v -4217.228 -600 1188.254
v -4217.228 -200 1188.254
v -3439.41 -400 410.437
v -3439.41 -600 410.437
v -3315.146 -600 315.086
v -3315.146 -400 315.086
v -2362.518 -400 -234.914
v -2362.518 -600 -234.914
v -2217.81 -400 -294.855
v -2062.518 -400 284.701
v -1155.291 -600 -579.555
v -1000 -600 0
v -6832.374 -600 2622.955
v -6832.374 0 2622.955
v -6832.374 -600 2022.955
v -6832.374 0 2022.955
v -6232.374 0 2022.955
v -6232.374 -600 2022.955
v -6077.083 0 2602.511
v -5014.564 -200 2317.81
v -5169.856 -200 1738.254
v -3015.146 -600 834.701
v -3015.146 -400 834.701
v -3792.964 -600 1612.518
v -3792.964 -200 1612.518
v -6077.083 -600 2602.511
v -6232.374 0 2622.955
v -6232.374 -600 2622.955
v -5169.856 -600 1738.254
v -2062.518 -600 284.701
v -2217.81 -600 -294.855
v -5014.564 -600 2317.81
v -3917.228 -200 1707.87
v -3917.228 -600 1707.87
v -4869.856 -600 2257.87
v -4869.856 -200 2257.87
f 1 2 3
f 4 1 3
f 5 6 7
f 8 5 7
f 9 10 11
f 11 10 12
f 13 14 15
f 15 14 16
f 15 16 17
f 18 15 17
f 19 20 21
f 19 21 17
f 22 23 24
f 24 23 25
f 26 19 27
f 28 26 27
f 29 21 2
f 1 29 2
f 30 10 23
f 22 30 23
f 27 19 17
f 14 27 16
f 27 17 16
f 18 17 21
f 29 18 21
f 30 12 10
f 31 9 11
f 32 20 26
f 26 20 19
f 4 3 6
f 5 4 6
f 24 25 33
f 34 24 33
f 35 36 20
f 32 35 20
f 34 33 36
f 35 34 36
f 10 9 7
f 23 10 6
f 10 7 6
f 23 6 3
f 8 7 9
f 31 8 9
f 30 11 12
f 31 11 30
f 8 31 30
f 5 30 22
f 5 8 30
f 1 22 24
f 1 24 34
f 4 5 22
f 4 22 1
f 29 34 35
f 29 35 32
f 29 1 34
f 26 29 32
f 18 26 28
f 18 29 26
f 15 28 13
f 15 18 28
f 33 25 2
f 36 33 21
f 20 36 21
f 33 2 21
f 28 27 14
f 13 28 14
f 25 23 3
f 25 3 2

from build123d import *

# Parameters (mm, degrees)
BOSS_EXTRUDE1_DEPTH = 600
CUT_EXTRUDE1_DEPTH  = 600
CUT_EXTRUDE2_DEPTH  = 600
CUT_EXTRUDE3_DEPTH  = 400
CUT_EXTRUDE4_DEPTH  = 600
CUT_EXTRUDE5_DEPTH  = 200
CUT_EXTRUDE6_DEPTH  = 6000
SKETCH16_W          = 2532.923378498
SKETCH16_H          = 1485.911209515
CUT_EXTRUDE7_DEPTH  = 1000


with BuildPart() as part:
    # Sketch1 → Boss-Extrude1 (new body)
    with BuildSketch(Plane(origin=(0, 0, 0), x_dir=(1, 0, 0), z_dir=(0, 1, 0))):
        Polygon((0, 0), (-1000, 0), (-2062.518408918, -284.700949613), (-3015.146353081, -834.700949613), (-3792.963812386, -1612.518408918), (-3917.227881098, -1707.869582477), (-4869.855825261, -2257.869582477), (-5014.564398199, -2317.809835979), (-6077.082807117, -2602.510785592), (-6232.374234179, -2622.955289819), (-7232.374234179, -2622.955289819), (-7232.374234179, -2022.955289819), (-6232.374234179, -2022.955289819), (-5169.855825261, -1738.254340206), (-4217.227881098, -1188.254340206), (-3439.410421793, -410.436880901), (-3315.146353081, -315.085707342), (-2362.518408918, 234.914292658), (-2217.809835979, 294.854546161), (-1155.291427062, 579.555495773), (-1000, 600), (0, 600), align=None)
    extrude(amount=-BOSS_EXTRUDE1_DEPTH)

    # Sketch9 → Cut-Extrude1 (cut)
    with BuildSketch(Plane(origin=(0, 0, 0), x_dir=(1, 0, 0), z_dir=(0, 1, 0))):
        Polygon((-1000, 0), (0, 0), (0, 600), (-1000, 600), (-1155.291427062, 579.555495773), align=None)
    extrude(amount=-CUT_EXTRUDE1_DEPTH, mode=Mode.SUBTRACT)

    # Sketch10 → Cut-Extrude2 (cut)
    with BuildSketch(Plane(origin=(-66.987298108, 0, -250), x_dir=(0.965925826, 0, -0.258819045), z_dir=(0.258819045, 0, 0.965925826))):
        Polygon((-2065.925826289, -400), (-965.925826289, -600), (-965.925826289, 0), (-2065.925826289, 0), align=None)
    extrude(amount=-CUT_EXTRUDE2_DEPTH, mode=Mode.SUBTRACT)

    # Sketch11 → Cut-Extrude3 (cut)
    with BuildSketch(Plane(origin=(0, 0, 0), x_dir=(1, 0, 0), z_dir=(0, 1, 0))):
        Polygon((-2062.518408918, -284.700949613), (-3015.146353081, -834.700949613), (-3439.410421793, -410.436880901), (-3315.146353081, -315.085707342), (-2362.518408918, 234.914292658), (-2217.809835979, 294.854546161), align=None)
    extrude(amount=-CUT_EXTRUDE3_DEPTH, mode=Mode.SUBTRACT)

    # Sketch12 → Cut-Extrude4 (cut)
    with BuildSketch(Plane(origin=(-1090.222701734, 0, -1090.222701734), x_dir=(0.707106781, 0, -0.707106781), z_dir=(0.707106781, 0, 0.707106781))):
        Polygon((-3822.253134267, -200), (-3822.253134267, 0), (-2722.253134267, 0), (-2722.253134267, -400), align=None)
    extrude(amount=-CUT_EXTRUDE4_DEPTH, mode=Mode.SUBTRACT)

    # Sketch13 → Cut-Extrude5 (cut)
    with BuildSketch(Plane(origin=(0, 0, 0), x_dir=(1, 0, 0), z_dir=(0, 1, 0))):
        Polygon((-4217.227881098, -1188.254340206), (-3792.963812386, -1612.518408918), (-3917.227881098, -1707.869582477), (-4869.855825261, -2257.869582477), (-5014.564398199, -2317.809835979), (-5169.855825261, -1738.254340206), align=None)
    extrude(amount=-CUT_EXTRUDE5_DEPTH, mode=Mode.SUBTRACT)

    # Sketch14 → Cut-Extrude6 (cut)
    with BuildSketch(Plane(origin=(243.540338772, 0, 908.90491799), x_dir=(0.965925826, 0, -0.258819045), z_dir=(0.258819045, 0, 0.965925826))):
        Polygon((-5443.590588288, -200), (-6543.590588288, 0), (-5443.590588288, 0), align=None)
    extrude(amount=-CUT_EXTRUDE6_DEPTH, mode=Mode.SUBTRACT)

    # Sketch16 → Cut-Extrude7 (cut)
    with BuildSketch(Plane(origin=(-6832.374234179, 0, 0), x_dir=(0, 0, -1), z_dir=(1, 0, 0))):
        with Locations((-1903.922097594, -233.533191628)):
            Rectangle(SKETCH16_W, SKETCH16_H)
    extrude(amount=-CUT_EXTRUDE7_DEPTH, mode=Mode.SUBTRACT)


solid = part.part
